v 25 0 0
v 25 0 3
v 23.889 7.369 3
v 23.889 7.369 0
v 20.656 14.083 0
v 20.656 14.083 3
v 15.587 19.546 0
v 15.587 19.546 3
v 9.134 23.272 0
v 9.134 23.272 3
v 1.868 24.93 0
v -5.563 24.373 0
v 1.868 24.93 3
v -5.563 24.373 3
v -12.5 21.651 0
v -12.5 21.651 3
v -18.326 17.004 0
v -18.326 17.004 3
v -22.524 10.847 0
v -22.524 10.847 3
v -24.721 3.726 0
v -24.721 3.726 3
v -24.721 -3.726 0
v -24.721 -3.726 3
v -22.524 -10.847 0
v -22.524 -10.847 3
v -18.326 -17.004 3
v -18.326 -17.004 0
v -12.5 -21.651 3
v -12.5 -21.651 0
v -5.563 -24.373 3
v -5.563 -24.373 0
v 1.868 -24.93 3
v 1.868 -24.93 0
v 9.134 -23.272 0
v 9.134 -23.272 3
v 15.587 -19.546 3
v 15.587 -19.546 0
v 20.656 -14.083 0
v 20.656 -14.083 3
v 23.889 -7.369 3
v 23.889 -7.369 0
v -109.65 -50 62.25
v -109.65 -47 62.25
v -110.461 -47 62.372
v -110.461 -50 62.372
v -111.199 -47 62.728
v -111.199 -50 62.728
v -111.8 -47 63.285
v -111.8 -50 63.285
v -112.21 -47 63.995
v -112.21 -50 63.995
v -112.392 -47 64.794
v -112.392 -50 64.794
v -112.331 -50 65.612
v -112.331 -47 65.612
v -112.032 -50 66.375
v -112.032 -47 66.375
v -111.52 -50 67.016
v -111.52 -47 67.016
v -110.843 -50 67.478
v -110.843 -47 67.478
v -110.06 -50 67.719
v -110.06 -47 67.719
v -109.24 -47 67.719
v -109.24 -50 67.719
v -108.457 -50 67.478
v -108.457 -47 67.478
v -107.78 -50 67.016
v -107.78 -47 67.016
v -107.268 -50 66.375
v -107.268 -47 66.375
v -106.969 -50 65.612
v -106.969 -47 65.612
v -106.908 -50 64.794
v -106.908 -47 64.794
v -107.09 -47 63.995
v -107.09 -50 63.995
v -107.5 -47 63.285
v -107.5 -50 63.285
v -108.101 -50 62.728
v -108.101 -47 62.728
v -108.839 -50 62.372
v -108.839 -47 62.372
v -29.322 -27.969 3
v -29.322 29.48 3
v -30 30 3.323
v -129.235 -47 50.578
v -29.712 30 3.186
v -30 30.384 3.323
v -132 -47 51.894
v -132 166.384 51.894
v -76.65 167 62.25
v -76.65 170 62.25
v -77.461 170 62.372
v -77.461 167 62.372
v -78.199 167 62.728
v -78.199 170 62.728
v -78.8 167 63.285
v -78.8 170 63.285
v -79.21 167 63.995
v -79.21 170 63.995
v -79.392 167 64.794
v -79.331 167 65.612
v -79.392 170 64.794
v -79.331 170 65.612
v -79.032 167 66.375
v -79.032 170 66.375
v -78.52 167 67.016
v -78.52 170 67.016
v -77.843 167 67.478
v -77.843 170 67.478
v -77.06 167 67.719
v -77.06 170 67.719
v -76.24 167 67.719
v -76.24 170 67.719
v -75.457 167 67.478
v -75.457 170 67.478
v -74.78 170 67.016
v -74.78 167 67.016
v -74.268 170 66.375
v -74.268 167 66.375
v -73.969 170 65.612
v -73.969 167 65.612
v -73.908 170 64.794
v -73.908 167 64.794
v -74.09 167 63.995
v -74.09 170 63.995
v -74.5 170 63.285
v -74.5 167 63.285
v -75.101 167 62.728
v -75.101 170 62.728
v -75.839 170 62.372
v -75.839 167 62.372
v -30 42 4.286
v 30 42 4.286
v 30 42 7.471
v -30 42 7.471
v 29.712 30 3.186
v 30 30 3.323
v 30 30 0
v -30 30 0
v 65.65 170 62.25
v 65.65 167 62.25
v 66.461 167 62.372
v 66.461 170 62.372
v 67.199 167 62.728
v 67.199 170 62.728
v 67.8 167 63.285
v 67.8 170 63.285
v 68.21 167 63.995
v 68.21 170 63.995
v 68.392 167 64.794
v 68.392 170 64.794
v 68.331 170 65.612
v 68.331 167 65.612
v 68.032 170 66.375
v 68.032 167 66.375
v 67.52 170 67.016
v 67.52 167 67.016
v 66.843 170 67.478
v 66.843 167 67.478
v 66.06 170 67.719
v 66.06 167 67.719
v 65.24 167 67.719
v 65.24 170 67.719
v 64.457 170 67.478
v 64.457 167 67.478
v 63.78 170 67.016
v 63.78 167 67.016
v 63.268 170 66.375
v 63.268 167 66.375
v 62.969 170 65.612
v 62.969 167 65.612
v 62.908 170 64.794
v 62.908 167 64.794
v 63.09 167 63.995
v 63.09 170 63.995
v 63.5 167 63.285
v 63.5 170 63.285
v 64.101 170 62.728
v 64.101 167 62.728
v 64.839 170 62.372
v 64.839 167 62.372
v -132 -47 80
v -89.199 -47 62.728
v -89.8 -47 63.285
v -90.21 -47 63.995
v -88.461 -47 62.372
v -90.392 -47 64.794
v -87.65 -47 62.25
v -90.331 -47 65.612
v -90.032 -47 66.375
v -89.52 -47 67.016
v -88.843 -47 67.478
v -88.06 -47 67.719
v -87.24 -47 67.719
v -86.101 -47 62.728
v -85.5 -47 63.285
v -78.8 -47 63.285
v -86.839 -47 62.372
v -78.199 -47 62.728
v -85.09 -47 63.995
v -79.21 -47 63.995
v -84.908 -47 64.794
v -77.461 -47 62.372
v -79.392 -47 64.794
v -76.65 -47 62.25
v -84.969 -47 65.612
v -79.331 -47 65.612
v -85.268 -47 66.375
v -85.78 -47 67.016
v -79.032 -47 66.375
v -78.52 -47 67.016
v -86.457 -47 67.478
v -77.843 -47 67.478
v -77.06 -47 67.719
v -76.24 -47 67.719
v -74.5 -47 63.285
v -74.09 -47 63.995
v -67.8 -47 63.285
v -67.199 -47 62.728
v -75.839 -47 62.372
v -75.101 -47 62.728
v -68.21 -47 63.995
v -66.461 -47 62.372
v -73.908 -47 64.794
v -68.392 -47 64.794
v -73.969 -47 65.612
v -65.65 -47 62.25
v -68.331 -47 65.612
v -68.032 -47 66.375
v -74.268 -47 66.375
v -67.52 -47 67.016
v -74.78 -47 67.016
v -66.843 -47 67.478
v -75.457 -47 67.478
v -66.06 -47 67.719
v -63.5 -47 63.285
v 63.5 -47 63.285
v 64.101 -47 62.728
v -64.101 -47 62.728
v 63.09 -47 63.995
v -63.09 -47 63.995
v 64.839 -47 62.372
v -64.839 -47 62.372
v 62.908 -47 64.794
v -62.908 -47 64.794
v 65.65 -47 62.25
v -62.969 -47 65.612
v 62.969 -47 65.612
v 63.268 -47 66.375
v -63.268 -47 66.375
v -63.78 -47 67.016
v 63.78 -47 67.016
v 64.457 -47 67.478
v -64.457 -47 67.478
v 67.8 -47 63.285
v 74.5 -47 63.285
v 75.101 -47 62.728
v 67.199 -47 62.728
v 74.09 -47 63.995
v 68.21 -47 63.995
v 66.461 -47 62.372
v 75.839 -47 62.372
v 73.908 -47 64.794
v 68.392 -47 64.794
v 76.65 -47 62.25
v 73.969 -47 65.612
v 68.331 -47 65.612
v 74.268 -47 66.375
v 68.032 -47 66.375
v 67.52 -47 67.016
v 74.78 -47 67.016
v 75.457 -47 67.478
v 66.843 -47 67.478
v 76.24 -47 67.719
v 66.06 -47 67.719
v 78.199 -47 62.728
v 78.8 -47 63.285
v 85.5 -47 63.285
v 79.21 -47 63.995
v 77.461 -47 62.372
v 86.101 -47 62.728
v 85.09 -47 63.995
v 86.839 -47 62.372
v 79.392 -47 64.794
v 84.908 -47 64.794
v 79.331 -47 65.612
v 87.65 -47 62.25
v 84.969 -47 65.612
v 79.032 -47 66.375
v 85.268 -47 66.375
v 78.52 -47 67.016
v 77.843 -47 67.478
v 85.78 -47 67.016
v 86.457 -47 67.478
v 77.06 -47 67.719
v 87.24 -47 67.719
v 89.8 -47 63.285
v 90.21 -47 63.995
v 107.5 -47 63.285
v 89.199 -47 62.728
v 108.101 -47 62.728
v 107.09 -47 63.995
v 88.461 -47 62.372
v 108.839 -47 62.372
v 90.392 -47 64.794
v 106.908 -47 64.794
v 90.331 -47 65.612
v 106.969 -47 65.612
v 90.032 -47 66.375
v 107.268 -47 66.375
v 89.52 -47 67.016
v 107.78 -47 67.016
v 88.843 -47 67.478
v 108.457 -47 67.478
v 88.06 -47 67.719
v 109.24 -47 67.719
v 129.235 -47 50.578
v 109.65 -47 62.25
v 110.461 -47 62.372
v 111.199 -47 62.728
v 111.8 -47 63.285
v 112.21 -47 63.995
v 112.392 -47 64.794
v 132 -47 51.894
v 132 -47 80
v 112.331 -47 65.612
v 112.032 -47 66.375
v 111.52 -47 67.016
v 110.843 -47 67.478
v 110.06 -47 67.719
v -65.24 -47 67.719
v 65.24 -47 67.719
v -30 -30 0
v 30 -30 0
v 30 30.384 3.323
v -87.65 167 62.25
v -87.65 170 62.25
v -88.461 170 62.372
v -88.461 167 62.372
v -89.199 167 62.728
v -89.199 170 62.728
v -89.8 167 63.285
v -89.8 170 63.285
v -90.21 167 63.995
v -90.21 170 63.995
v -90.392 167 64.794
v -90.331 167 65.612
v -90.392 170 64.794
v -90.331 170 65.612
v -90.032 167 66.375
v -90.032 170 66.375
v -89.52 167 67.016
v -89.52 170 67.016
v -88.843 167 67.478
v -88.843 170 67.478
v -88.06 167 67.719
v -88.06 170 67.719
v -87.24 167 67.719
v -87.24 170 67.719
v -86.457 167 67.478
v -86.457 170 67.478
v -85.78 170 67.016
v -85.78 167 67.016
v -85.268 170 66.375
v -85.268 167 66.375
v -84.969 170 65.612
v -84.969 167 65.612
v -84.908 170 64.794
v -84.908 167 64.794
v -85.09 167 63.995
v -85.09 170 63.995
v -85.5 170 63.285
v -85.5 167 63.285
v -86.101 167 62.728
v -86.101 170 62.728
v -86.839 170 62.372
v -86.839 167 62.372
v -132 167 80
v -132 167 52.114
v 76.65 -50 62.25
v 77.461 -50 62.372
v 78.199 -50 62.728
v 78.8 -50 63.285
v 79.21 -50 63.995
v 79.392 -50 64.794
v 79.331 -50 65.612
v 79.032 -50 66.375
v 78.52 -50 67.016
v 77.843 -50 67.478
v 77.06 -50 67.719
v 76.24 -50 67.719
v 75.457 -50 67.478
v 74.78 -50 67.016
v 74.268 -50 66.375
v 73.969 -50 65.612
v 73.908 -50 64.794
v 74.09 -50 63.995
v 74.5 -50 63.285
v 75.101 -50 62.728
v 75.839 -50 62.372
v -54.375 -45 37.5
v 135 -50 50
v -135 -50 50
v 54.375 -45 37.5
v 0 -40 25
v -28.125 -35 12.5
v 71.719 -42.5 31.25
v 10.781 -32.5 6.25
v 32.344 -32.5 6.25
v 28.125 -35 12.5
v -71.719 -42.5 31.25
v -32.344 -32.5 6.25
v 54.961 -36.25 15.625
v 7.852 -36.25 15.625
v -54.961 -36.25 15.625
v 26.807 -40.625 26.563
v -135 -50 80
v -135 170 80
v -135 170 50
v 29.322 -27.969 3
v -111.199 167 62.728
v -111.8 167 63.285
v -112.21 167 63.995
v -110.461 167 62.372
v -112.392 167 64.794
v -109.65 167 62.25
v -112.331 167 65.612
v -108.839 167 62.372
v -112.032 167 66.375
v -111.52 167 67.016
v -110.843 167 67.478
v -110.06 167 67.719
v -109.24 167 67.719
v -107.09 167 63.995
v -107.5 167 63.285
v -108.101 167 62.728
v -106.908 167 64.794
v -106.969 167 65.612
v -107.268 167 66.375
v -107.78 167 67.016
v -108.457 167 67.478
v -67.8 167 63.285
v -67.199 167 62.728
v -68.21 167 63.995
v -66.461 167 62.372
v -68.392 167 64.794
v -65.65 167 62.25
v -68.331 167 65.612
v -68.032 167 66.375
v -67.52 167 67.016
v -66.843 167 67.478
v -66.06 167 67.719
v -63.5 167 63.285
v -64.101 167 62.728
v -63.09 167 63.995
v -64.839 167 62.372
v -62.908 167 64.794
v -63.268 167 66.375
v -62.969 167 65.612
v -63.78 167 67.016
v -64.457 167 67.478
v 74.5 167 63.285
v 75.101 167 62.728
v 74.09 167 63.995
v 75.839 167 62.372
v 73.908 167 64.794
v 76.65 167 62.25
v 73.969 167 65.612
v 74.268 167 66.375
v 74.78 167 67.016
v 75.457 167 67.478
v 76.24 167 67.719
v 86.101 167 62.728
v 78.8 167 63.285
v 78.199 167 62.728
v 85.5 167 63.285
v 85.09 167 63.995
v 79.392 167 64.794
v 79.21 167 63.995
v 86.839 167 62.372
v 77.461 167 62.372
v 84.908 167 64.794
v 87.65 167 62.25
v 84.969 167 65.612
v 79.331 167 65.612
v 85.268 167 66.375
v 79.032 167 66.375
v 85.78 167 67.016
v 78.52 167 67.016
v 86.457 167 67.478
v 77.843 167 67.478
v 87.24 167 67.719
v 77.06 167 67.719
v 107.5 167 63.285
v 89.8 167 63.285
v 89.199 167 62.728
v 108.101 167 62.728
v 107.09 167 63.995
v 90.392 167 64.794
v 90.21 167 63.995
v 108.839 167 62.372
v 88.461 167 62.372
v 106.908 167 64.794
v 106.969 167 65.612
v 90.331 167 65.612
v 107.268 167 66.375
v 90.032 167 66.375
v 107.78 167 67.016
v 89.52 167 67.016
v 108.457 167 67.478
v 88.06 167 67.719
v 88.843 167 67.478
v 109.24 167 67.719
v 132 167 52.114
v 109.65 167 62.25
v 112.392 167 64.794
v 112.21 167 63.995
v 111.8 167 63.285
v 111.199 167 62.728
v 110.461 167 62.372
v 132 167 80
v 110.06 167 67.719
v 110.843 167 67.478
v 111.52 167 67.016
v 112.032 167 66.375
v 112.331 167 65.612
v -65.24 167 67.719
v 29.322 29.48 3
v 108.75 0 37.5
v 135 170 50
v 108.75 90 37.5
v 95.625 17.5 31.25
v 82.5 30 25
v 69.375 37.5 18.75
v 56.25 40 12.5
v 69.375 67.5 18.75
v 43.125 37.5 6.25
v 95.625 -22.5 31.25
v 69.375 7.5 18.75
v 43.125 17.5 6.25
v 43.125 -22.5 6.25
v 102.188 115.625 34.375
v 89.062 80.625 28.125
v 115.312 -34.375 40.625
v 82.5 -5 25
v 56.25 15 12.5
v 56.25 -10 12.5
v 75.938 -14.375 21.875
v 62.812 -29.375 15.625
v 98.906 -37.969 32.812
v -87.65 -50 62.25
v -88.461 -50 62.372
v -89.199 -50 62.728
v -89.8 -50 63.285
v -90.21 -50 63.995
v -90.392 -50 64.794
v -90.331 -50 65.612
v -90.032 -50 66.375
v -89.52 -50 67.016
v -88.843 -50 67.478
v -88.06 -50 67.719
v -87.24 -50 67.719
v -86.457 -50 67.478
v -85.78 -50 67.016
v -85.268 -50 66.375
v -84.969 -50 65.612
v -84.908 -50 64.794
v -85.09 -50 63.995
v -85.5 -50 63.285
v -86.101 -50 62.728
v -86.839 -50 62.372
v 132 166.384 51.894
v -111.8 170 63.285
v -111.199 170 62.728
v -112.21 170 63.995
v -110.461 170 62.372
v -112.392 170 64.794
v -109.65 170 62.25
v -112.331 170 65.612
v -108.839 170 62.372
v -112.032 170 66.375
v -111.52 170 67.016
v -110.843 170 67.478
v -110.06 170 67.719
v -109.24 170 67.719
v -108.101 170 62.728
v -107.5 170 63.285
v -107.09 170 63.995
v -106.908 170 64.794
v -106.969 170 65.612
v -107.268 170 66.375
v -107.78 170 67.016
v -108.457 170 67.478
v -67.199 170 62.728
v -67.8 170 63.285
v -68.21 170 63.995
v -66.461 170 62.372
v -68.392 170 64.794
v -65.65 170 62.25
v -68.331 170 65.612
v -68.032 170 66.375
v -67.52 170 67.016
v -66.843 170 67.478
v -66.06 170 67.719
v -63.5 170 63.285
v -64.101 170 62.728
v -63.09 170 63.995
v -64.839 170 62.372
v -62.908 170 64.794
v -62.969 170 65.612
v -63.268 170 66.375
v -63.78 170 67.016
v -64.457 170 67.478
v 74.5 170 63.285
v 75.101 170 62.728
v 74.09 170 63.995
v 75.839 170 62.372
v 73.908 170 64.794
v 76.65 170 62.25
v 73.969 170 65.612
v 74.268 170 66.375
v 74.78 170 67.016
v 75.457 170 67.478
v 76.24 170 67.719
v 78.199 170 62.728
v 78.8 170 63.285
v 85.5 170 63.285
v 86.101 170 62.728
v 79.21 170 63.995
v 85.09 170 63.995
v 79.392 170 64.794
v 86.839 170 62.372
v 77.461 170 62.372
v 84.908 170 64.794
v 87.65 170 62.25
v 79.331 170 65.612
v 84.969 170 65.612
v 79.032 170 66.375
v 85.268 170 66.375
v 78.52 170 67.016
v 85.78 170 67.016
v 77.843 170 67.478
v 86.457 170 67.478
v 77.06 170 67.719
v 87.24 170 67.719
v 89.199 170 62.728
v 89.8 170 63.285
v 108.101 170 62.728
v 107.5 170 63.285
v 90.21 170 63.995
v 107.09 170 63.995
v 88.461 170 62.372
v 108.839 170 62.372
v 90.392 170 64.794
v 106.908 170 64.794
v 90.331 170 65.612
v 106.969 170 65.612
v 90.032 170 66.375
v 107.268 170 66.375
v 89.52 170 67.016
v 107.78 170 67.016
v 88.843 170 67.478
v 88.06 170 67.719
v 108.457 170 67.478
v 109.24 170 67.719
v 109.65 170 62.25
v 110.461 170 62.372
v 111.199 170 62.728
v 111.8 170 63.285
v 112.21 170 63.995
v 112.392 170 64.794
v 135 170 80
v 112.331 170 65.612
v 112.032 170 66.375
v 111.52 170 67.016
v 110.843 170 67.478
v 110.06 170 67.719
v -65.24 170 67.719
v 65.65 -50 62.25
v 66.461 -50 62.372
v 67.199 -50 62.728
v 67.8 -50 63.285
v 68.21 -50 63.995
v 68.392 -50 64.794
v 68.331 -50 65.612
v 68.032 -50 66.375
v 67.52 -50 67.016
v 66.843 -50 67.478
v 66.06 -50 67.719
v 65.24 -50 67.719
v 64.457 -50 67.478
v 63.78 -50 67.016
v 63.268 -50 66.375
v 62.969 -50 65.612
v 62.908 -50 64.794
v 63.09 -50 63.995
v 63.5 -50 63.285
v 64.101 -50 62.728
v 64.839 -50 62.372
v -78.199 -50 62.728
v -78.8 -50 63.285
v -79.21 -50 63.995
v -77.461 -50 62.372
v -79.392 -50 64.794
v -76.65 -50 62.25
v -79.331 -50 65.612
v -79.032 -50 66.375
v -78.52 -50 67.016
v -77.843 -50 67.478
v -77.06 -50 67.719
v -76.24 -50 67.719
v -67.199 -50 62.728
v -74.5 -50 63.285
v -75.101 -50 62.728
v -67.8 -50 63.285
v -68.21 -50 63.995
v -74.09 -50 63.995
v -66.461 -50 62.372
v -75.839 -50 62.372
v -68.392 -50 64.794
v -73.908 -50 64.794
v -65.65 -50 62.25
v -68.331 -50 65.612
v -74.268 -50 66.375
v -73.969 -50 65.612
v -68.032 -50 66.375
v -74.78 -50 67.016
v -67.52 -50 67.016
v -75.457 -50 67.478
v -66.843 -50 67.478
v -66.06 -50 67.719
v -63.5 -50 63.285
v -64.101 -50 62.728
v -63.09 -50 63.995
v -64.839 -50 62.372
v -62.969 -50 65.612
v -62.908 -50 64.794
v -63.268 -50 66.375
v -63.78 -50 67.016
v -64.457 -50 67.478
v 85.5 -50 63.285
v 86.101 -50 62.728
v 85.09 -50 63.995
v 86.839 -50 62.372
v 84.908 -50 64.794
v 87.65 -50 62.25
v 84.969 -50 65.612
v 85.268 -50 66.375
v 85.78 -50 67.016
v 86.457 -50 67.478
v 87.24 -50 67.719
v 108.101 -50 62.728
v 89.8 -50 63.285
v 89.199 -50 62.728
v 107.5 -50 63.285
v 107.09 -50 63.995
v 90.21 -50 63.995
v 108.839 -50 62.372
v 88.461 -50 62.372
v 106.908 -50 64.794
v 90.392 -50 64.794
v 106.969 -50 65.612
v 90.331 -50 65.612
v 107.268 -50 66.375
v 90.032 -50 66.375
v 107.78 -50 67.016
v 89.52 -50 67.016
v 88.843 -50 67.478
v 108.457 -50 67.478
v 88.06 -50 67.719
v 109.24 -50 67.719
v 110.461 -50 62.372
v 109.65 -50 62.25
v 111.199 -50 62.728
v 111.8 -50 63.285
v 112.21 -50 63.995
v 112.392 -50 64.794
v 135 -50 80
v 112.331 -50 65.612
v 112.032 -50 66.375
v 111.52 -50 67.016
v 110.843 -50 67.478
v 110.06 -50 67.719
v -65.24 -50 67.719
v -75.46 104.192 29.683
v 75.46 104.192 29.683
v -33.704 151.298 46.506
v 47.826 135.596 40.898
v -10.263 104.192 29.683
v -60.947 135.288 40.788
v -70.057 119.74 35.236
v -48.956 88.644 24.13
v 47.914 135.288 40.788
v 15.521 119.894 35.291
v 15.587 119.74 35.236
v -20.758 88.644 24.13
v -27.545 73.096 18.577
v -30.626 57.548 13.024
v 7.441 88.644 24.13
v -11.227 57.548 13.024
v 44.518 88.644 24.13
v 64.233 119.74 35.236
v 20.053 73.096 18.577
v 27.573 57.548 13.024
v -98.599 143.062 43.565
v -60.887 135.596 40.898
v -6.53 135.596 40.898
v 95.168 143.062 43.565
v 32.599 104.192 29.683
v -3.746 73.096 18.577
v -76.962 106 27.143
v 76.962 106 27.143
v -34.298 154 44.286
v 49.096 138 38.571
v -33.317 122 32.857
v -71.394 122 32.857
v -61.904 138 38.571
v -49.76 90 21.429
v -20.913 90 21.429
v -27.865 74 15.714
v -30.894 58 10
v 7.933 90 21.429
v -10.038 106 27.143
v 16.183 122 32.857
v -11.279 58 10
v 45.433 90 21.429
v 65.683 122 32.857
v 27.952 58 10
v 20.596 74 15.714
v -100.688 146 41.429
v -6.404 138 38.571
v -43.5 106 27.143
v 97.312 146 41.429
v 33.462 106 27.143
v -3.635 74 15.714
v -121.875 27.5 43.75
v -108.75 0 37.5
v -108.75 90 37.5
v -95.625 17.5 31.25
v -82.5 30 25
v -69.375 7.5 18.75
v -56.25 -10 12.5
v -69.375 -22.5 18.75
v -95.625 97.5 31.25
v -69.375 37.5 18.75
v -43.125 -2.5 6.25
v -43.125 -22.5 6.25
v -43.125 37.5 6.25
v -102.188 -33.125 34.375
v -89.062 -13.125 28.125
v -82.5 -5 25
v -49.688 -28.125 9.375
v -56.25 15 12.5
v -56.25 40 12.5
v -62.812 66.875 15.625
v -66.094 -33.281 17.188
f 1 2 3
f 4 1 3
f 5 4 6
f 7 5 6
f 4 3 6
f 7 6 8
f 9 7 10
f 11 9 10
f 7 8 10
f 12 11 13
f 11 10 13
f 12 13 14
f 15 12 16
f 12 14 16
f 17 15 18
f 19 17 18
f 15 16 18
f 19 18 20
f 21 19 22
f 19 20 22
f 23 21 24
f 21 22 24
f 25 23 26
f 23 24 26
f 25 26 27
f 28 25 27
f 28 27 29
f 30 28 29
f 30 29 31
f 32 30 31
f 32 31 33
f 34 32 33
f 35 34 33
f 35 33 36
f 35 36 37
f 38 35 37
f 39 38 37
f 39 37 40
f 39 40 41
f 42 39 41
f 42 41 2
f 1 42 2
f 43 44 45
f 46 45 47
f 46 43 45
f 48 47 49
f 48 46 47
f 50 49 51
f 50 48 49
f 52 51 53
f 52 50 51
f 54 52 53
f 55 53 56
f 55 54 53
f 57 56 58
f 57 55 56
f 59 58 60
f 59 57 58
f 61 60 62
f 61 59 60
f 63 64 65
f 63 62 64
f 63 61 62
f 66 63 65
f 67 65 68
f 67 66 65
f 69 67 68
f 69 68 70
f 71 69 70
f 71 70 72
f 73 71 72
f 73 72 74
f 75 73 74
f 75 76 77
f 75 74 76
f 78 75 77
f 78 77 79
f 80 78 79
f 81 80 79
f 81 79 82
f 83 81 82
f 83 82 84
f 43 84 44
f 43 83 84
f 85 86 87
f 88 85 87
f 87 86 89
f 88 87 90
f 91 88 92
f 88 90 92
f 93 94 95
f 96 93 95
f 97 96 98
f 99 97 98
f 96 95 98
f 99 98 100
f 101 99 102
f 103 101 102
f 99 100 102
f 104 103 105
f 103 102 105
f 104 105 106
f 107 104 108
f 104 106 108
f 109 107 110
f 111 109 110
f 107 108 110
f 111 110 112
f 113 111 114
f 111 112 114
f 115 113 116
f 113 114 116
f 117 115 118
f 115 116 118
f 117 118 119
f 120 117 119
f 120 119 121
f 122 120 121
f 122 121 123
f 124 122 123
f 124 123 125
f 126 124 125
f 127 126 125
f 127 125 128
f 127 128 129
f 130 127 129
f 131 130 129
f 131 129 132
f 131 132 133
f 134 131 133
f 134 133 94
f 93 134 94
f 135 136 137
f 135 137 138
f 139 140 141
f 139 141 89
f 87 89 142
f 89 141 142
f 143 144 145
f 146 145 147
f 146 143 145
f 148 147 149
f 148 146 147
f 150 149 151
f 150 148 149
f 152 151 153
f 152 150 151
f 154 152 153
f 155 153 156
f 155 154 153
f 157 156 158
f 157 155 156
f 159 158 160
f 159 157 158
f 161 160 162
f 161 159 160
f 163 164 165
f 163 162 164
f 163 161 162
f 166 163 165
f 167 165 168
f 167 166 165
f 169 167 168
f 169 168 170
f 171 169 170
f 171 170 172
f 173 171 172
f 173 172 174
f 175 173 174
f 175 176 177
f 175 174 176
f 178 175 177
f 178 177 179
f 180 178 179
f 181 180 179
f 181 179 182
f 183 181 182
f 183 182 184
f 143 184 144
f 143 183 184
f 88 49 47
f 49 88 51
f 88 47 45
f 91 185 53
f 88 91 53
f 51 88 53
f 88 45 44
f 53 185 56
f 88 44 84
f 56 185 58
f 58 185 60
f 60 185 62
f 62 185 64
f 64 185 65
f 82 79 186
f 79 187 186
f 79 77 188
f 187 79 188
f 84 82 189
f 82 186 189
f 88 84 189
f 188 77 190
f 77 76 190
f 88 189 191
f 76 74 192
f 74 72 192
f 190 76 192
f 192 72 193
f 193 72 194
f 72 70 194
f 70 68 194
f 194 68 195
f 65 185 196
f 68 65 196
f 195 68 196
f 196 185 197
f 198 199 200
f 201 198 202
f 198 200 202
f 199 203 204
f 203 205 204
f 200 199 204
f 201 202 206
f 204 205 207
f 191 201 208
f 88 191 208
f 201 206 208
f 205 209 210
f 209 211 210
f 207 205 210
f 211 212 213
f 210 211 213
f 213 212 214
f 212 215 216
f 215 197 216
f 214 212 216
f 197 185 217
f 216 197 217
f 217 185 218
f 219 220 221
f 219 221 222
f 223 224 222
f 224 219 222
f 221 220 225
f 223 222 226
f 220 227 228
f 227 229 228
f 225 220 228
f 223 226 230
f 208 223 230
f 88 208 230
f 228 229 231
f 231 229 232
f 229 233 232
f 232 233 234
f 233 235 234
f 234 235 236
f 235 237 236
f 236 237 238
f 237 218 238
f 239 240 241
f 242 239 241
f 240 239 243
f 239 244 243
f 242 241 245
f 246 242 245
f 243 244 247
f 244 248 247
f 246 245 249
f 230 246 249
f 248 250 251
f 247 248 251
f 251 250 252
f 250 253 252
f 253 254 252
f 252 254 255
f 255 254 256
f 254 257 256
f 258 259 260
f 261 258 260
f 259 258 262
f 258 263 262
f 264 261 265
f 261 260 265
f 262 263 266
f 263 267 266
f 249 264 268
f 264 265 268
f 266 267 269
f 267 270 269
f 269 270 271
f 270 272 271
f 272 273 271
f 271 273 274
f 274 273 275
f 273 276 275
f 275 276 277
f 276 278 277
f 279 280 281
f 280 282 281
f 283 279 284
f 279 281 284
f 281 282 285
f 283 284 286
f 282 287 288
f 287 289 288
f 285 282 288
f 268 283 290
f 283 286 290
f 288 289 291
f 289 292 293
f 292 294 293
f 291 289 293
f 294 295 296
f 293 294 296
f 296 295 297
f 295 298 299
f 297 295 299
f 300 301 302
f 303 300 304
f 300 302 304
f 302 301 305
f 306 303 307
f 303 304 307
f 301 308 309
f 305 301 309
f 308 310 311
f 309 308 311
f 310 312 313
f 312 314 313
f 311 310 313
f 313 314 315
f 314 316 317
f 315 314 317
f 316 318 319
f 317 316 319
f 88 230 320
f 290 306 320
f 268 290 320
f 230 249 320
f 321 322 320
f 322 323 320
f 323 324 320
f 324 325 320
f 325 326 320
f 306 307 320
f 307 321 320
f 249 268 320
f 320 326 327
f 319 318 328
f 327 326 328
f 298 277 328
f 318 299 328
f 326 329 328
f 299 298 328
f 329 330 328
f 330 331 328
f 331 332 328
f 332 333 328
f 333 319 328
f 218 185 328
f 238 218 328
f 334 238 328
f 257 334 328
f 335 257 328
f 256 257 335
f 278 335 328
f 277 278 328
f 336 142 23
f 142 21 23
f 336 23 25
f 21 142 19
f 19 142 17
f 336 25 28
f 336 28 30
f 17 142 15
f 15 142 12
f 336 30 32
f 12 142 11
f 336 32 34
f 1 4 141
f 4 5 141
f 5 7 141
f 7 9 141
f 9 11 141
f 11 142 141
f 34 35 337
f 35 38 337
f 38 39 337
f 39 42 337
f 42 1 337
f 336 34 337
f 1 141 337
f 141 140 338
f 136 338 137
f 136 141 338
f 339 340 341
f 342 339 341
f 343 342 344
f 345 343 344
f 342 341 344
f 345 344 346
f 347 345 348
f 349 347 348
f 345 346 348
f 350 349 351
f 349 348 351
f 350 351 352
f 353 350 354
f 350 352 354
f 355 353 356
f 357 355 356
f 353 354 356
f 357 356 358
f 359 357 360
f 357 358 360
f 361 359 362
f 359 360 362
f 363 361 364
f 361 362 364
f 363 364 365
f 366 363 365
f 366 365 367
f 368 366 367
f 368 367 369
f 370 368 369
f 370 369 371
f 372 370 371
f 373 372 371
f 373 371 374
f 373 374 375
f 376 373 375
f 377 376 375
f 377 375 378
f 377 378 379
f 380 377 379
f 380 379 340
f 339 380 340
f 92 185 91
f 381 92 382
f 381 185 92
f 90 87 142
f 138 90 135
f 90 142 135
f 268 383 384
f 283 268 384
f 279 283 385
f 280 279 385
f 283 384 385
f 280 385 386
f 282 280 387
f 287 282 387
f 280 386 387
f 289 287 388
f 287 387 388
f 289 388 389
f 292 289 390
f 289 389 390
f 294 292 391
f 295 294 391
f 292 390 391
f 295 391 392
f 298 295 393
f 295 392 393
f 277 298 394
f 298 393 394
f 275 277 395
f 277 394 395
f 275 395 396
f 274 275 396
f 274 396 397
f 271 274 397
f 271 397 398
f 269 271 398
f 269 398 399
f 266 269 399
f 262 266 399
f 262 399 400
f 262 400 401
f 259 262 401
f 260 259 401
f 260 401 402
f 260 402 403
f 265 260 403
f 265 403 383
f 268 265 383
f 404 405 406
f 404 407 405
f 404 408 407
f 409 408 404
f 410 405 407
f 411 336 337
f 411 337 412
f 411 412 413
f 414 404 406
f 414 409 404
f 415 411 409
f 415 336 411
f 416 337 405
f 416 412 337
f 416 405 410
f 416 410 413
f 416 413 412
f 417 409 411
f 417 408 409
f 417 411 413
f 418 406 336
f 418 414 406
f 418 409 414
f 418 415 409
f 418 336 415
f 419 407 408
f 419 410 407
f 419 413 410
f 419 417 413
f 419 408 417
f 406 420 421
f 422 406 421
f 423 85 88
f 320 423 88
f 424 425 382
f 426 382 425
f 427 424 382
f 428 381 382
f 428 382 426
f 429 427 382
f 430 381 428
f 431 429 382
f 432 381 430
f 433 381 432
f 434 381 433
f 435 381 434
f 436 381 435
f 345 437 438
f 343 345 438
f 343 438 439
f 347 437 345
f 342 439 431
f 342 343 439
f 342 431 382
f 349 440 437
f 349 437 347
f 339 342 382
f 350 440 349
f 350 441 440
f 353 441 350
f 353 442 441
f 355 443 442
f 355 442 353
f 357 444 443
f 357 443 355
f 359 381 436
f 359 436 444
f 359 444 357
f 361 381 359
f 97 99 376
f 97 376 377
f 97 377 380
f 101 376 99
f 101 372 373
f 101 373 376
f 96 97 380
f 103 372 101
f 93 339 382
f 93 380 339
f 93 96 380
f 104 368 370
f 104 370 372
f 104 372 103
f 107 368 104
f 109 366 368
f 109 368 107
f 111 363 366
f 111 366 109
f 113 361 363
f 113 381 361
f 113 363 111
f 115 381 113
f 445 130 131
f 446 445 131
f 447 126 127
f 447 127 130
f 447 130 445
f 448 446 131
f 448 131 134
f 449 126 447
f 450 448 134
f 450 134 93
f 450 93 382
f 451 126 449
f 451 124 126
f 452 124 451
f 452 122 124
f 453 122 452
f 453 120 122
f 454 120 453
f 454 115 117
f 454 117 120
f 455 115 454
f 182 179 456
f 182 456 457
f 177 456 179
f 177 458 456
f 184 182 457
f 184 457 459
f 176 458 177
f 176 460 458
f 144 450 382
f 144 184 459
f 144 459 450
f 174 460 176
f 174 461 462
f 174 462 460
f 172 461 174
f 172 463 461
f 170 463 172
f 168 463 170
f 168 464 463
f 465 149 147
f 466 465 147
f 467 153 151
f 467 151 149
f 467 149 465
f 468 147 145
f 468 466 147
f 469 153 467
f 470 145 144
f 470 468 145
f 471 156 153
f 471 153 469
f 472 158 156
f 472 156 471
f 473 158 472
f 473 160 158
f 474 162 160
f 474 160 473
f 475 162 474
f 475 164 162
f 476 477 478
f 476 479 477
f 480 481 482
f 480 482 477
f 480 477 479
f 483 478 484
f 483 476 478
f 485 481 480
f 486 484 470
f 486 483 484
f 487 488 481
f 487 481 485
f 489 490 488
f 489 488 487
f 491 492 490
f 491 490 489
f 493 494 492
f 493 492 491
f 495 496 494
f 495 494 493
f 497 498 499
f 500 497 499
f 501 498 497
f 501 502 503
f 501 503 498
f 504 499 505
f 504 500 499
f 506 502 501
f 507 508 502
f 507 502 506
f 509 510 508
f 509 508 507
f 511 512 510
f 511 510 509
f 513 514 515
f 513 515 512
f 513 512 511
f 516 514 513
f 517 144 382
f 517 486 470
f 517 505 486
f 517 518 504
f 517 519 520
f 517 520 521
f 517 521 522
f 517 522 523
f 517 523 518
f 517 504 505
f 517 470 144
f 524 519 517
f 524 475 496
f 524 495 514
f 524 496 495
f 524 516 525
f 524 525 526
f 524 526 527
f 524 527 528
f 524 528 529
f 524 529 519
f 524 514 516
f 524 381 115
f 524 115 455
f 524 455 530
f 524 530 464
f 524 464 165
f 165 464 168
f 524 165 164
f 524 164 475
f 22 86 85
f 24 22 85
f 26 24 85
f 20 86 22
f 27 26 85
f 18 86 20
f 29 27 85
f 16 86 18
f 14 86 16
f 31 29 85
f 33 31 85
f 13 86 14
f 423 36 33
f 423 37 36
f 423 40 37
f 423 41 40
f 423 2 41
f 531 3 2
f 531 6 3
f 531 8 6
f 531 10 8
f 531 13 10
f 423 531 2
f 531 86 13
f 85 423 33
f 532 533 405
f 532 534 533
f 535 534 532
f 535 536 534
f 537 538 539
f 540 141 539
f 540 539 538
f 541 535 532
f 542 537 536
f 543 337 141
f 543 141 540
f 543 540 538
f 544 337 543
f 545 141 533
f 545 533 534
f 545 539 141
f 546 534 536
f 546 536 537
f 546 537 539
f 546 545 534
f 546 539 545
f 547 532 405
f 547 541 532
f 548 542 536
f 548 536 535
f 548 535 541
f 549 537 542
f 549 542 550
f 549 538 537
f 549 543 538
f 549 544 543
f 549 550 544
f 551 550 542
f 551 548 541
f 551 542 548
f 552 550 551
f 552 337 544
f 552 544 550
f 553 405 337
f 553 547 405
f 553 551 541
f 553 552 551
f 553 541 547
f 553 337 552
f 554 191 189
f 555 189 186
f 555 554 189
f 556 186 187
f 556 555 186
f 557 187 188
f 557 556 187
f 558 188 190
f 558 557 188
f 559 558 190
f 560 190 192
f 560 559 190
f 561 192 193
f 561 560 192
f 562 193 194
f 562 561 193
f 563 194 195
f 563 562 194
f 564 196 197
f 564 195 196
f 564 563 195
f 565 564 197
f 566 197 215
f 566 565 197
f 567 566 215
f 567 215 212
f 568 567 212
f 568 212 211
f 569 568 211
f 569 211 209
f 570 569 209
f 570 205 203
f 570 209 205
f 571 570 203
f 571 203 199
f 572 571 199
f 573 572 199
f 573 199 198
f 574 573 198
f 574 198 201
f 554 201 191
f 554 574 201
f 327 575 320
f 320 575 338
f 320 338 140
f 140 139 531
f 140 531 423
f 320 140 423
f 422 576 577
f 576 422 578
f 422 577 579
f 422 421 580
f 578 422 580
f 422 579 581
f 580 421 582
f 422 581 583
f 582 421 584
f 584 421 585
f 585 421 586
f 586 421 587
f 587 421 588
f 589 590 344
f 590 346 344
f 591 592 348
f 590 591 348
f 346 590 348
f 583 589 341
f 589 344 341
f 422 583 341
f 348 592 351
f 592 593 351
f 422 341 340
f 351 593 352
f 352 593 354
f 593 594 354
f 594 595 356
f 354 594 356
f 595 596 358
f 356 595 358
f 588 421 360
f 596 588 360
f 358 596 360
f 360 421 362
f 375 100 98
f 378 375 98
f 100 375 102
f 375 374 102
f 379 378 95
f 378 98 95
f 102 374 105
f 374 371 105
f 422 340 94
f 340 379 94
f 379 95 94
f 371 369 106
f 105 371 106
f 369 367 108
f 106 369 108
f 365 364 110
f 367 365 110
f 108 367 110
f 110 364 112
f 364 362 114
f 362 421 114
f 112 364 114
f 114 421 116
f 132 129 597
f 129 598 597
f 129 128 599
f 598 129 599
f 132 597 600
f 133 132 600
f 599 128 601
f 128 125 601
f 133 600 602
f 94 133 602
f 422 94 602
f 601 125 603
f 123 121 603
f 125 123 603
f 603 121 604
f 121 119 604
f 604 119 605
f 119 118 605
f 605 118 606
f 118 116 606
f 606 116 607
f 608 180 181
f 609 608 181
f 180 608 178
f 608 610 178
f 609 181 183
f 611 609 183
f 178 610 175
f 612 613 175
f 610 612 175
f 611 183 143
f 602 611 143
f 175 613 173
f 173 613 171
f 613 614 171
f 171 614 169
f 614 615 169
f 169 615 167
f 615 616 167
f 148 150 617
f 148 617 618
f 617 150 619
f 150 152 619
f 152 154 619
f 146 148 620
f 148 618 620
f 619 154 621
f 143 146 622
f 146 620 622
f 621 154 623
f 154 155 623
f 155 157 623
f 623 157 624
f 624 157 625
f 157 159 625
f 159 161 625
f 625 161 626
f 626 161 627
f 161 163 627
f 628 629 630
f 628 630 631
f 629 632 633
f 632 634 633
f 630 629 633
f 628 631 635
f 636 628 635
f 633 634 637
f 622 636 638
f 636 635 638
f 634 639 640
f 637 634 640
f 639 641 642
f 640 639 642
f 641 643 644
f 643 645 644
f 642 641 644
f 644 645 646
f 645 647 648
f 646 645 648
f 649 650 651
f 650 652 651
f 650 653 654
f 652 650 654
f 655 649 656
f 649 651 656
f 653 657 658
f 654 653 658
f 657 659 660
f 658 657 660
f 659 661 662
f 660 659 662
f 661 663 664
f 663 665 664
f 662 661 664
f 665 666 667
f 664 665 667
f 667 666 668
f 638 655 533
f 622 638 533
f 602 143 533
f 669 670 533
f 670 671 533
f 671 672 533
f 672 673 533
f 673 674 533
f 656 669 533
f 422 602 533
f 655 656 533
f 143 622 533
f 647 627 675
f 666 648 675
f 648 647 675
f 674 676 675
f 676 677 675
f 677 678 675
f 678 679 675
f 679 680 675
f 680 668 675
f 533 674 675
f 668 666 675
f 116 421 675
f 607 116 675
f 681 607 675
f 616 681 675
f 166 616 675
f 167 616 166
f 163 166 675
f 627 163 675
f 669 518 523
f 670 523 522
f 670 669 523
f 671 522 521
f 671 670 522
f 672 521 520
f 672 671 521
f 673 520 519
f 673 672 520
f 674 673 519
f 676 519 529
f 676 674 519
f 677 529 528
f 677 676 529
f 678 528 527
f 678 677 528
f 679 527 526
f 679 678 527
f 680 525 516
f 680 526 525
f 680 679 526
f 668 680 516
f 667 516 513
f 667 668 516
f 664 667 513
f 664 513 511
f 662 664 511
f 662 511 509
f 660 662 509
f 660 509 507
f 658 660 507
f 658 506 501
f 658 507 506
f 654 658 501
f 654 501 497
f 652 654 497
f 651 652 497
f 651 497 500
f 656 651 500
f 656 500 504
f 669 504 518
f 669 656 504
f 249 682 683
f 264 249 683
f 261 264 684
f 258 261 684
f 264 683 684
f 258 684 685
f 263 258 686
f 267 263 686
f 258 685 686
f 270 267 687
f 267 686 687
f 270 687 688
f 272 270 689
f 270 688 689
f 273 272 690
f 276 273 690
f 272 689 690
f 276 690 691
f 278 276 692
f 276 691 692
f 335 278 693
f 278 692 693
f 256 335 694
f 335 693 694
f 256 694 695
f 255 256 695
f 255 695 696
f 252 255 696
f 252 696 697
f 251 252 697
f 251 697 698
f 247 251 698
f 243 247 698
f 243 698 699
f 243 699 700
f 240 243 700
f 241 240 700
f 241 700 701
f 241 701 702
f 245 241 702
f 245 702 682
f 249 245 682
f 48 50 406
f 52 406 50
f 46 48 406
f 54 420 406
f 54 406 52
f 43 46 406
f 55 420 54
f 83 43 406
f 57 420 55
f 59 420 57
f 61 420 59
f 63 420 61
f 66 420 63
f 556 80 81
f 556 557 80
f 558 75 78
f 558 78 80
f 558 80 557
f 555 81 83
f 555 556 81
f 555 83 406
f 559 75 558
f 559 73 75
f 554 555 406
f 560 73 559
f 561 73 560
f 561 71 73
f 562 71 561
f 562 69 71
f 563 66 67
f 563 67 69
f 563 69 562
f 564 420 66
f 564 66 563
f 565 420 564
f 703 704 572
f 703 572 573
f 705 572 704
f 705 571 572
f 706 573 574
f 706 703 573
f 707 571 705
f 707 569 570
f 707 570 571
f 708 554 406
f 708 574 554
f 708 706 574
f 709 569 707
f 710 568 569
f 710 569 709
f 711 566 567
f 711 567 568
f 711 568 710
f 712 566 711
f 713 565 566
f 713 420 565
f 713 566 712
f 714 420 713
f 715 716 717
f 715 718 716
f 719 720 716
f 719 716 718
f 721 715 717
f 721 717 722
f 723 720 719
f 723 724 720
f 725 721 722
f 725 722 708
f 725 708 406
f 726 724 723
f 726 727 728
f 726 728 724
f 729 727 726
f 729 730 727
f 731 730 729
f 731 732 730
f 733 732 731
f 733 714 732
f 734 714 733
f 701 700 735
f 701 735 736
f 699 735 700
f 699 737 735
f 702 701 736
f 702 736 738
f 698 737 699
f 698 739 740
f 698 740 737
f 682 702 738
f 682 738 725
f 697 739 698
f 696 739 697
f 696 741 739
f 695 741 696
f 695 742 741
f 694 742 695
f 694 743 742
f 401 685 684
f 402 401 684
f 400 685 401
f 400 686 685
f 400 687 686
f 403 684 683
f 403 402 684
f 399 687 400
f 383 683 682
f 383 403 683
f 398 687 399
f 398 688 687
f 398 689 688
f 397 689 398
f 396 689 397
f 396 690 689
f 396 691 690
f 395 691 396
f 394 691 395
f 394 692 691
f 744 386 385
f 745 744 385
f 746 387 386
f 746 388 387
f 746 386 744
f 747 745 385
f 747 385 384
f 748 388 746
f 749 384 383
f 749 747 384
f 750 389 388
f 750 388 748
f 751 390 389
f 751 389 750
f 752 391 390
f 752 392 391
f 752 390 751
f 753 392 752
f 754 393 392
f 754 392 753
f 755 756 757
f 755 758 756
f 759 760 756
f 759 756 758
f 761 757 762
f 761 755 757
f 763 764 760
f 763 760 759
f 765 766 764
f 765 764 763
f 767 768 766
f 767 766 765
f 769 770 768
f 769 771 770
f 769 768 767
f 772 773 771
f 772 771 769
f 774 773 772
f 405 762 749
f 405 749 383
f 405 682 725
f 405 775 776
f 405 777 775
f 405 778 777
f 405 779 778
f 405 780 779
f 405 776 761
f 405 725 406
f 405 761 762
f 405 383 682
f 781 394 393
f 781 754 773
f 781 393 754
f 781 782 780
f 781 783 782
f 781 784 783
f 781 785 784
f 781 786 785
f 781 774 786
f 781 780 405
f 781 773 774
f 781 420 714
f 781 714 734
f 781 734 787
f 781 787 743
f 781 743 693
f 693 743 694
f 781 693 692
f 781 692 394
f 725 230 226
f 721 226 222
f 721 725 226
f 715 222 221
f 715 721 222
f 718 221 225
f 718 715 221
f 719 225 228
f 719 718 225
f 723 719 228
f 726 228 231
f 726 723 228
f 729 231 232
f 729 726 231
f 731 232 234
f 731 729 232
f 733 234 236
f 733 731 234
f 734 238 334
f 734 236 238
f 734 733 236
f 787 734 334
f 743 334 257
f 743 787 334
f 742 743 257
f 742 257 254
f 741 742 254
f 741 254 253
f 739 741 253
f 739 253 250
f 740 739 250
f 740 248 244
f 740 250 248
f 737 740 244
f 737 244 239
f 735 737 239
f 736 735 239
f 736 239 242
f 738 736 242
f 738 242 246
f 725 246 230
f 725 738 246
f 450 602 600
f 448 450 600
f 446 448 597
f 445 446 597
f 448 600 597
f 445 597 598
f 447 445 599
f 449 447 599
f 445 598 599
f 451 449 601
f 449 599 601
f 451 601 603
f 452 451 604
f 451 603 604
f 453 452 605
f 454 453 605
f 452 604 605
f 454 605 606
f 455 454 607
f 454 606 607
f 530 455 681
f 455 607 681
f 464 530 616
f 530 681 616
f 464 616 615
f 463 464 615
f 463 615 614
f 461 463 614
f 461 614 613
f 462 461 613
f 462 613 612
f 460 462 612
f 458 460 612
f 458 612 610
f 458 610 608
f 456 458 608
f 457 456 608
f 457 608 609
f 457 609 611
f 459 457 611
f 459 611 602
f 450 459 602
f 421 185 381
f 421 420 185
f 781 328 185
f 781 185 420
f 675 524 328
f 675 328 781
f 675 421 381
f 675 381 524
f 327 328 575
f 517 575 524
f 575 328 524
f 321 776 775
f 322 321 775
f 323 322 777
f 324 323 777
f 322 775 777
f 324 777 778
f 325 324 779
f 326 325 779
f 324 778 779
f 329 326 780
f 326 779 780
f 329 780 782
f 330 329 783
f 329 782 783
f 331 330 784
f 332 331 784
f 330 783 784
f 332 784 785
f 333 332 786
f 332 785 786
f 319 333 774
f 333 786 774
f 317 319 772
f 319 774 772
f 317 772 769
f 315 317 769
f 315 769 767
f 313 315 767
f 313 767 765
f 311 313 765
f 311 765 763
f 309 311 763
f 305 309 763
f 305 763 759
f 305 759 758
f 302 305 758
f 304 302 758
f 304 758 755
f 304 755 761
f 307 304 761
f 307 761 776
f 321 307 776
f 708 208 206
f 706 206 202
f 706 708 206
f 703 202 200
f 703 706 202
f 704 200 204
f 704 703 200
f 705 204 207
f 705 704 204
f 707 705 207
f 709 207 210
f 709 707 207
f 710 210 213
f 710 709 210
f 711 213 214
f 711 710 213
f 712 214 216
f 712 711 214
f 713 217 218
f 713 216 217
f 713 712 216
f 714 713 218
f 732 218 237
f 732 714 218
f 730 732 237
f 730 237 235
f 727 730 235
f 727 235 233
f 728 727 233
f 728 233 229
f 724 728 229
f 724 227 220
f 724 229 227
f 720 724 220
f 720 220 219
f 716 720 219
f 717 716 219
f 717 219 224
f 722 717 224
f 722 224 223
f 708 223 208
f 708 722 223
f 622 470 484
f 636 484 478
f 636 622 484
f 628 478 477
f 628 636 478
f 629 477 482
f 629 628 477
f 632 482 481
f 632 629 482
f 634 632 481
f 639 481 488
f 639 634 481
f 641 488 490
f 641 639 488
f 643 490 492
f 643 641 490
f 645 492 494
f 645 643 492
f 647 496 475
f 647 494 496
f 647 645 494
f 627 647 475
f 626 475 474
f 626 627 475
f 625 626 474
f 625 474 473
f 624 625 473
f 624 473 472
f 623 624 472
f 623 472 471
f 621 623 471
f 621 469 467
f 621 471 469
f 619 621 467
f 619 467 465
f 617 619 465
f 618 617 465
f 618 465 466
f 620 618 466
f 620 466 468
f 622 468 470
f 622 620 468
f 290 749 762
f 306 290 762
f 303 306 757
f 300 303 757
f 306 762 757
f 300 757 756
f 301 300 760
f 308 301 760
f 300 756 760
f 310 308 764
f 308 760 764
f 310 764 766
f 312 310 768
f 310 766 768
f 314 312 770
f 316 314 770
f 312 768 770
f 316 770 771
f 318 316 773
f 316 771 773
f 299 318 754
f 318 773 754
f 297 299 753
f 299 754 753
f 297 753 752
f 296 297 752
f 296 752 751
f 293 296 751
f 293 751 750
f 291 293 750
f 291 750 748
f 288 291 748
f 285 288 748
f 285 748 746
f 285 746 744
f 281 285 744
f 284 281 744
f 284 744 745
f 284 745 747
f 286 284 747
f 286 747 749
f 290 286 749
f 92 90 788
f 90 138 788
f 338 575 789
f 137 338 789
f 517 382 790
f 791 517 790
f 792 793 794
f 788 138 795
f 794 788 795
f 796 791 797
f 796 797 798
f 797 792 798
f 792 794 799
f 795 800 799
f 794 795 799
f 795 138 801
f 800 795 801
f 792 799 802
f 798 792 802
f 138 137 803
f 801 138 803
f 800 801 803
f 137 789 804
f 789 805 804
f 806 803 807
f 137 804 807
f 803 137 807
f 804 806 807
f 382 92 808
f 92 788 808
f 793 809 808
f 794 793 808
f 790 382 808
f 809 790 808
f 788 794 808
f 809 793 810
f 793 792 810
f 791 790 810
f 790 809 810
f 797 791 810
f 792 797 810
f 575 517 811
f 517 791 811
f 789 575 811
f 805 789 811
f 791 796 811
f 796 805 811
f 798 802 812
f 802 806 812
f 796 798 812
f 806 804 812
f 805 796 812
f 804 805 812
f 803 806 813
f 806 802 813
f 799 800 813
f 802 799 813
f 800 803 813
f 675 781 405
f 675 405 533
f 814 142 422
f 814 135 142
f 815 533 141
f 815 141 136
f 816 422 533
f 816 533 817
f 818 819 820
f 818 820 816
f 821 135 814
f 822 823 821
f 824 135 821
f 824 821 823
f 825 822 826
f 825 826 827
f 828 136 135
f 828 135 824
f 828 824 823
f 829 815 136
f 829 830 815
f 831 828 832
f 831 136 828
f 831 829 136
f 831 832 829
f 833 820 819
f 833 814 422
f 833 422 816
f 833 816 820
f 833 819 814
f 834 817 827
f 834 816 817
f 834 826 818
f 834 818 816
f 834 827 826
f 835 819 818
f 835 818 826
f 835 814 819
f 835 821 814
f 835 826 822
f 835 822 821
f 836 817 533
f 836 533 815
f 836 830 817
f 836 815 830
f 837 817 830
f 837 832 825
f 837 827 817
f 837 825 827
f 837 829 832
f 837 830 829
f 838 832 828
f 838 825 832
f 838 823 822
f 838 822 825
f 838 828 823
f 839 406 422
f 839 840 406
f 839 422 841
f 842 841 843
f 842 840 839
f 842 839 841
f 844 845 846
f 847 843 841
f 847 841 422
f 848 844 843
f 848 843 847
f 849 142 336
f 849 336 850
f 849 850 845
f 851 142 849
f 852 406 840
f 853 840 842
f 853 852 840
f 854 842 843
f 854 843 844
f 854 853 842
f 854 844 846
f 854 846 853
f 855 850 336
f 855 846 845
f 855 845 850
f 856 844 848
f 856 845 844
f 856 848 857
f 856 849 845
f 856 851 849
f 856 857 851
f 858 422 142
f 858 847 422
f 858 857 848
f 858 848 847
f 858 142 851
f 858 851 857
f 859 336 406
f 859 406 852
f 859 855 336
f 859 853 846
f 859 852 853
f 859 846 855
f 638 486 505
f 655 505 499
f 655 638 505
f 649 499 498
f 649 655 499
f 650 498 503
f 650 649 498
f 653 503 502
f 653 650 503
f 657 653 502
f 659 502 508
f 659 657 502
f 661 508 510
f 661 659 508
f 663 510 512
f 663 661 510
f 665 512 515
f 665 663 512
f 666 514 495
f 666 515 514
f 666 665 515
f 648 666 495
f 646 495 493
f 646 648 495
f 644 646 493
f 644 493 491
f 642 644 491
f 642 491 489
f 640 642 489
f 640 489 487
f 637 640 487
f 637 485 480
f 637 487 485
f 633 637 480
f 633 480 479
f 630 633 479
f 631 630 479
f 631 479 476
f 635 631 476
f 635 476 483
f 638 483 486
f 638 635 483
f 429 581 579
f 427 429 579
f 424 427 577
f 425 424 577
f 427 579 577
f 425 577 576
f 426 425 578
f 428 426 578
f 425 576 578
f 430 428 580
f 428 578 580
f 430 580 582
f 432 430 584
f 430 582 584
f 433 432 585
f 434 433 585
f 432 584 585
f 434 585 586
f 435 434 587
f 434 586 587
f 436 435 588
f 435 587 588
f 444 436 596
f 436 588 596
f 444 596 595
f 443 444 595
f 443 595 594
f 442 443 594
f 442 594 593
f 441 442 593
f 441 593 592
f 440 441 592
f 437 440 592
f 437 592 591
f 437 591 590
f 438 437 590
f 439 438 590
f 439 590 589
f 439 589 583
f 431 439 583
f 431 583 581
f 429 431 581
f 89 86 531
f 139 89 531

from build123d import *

# Parameters (mm, degrees)
EXTRUDE_1_REACH          = 233.355
SKETCH_5_W               = 270
SKETCH_5_H               = 220
SHELL_1_T                = -3
SKETCH_3_R               = 25
CUT_EXTRUDE_1_DEPTH      = 10
SKETCH_4_W               = 60
SKETCH_4_H               = 12
CUT_EXTRUDE_2_DEPTH      = 30
SKETCH_6_R               = 2.75
CUT_EXTRUDE_3_DEPTH      = 10
MIRROR_2_COPY_1_SKETCH_R = 2.75
MIRROR_2_COPY_1_DEPTH    = 10


with BuildPart() as part:
    # 草图2 → 放样2 section 0
    with BuildSketch(Plane.XY.offset(50)):
        with BuildLine():
            Line((-135, 170), (135, 170))
            Line((135, 170), (135, -50))
            Line((135, -50), (-135, -50))
            Line((-135, -50), (-135, 170))
        make_face()
    # 草图1 → 放样2 section 1
    with BuildSketch(Plane.XY):
        with BuildLine():
            Line((-30, 30), (30, 30))
            Line((30, 30), (30, -30))
            Line((30, -30), (-30, -30))
            Line((-30, -30), (-30, 30))
        make_face()
    loft()

    # 草图5 → 凸台-拉伸1 (add, up to next)
    with BuildSketch(Plane.XY.offset(80), mode=Mode.PRIVATE) as extrude_1_sk1:
        with Locations((0, 60)):
            Rectangle(SKETCH_5_W, SKETCH_5_H)
    extrude_1_tool1 = extrude(extrude_1_sk1.sketch, amount=-EXTRUDE_1_REACH, mode=Mode.PRIVATE) - part.part
    add(extrude_1_tool1.solids().sort_by_distance((0, 60, 80))[0])

    # 抽壳1
    shell_1_openings = [part.faces().sort_by_distance(p)[0] for p in [
        (0, 60, 80),
    ]]
    offset(amount=SHELL_1_T, openings=shell_1_openings)

    # 草图3 → 切除-拉伸1 (cut)
    with BuildSketch(Plane.XY.offset(3)):
        Circle(SKETCH_3_R)
    extrude(amount=-CUT_EXTRUDE_1_DEPTH, mode=Mode.SUBTRACT)

    # 草图4 → 切除-拉伸2 (cut)
    with BuildSketch(Plane(origin=(0, 0, 0), x_dir=(-1, 0, 0), z_dir=(0, 0, -1))):
        with Locations((0, 36)):
            Rectangle(SKETCH_4_W, SKETCH_4_H)
    extrude(amount=-CUT_EXTRUDE_2_DEPTH, mode=Mode.SUBTRACT)

    # 草图6 → 切除-拉伸3 (cut)
    with BuildSketch(Plane.XZ.offset(50)):
        with Locations(Location((65.65, 65, 0), (0, 0, 270))):
            Circle(SKETCH_6_R)
        with Locations(Location((76.65, 65, 0), (0, 0, 270))):
            Circle(SKETCH_6_R)
        with Locations(Location((87.65, 65, 0), (0, 0, 270))):
            Circle(SKETCH_6_R)
        with Locations(Location((109.65, 65, 0), (0, 0, 270))):
            Circle(SKETCH_6_R)
    cut_extrude_3 = extrude(amount=-CUT_EXTRUDE_3_DEPTH, mode=Mode.SUBTRACT)

    # 镜向1: 切除-拉伸3 across plane
    add(cut_extrude_3.mirror(Plane(origin=(0, 60, 0), x_dir=(0, 0, 1), z_dir=(0, -1, 0))), mode=Mode.SUBTRACT)

    # 镜向2: 切除-拉伸3 across plane
    add(cut_extrude_3.mirror(Plane(origin=(0, 0, 0), x_dir=(0, 0, 1), z_dir=(1, 0, 0))), mode=Mode.SUBTRACT)

    # 镜向2 copy 1 sketch → 镜向2 copy 1 (cut)
    with BuildSketch(Plane(origin=(0, 170, 0), x_dir=(-1, 0, 0), z_dir=(0, 1, 0))):
        with Locations(Location((65.65, 65, 0), (0, 0, 270))):
            Circle(MIRROR_2_COPY_1_SKETCH_R)
        with Locations(Location((76.65, 65, 0), (0, 0, 270))):
            Circle(MIRROR_2_COPY_1_SKETCH_R)
        with Locations(Location((87.65, 65, 0), (0, 0, 270))):
            Circle(MIRROR_2_COPY_1_SKETCH_R)
        with Locations(Location((109.65, 65, 0), (0, 0, 270))):
            Circle(MIRROR_2_COPY_1_SKETCH_R)
    extrude(amount=-MIRROR_2_COPY_1_DEPTH, mode=Mode.SUBTRACT)


solid = part.part
